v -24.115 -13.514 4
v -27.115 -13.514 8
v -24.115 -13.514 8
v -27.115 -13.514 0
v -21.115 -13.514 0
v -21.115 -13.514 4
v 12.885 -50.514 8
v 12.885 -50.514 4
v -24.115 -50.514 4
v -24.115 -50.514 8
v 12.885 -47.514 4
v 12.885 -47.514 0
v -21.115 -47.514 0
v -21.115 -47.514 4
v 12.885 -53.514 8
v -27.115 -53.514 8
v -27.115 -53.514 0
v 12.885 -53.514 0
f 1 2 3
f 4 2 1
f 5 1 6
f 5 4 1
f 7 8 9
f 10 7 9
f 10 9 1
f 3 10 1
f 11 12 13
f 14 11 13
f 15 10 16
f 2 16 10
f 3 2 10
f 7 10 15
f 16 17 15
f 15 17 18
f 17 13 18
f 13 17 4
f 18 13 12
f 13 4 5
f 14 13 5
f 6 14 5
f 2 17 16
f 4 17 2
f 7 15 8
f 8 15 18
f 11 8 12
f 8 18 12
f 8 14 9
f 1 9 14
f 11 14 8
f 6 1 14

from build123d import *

# Parameters (mm, degrees)
F2_DEPTH = 4
F4_DEPTH = 4
F5_W     = 129.927155
F5_H     = 119.906087
F5_W_2   = 40
F5_H_2   = 40
F6_DEPTH = 8.001


with BuildPart() as f2:
    # F1 (on Top) → F2 (new body)
    with BuildSketch(Plane.XY):
        Polygon((40.684865, -47.513555), (-21.115135, -47.513555), (-21.115135, 14.286445), (-40.215135, 33.386445), (-40.215135, -66.613555), (59.784865, -66.613555), align=None)
    extrude(amount=F2_DEPTH)

    # F3 (on face) → F4 (join)
    with BuildSketch(Plane.XY.offset(4)):
        Polygon((-24.115135, -3.086945), (-40.215135, -3.086945), (-40.215135, -66.613555), (15.733283, -66.613555), (15.733283, -50.513555), (-24.115135, -50.513555), align=None)
    extrude(amount=F4_DEPTH)

    # F5 (on Top) → F6 (cut, through all)
    with BuildSketch(Plane.XY):
        with Locations((8.65676, -20.336797)):
            Rectangle(F5_W, F5_H)
        with Locations((-7.115135, -33.513555)):
            Rectangle(F5_W_2, F5_H_2, mode=Mode.SUBTRACT)
    extrude(amount=F6_DEPTH, mode=Mode.SUBTRACT)


solid = f2.part
